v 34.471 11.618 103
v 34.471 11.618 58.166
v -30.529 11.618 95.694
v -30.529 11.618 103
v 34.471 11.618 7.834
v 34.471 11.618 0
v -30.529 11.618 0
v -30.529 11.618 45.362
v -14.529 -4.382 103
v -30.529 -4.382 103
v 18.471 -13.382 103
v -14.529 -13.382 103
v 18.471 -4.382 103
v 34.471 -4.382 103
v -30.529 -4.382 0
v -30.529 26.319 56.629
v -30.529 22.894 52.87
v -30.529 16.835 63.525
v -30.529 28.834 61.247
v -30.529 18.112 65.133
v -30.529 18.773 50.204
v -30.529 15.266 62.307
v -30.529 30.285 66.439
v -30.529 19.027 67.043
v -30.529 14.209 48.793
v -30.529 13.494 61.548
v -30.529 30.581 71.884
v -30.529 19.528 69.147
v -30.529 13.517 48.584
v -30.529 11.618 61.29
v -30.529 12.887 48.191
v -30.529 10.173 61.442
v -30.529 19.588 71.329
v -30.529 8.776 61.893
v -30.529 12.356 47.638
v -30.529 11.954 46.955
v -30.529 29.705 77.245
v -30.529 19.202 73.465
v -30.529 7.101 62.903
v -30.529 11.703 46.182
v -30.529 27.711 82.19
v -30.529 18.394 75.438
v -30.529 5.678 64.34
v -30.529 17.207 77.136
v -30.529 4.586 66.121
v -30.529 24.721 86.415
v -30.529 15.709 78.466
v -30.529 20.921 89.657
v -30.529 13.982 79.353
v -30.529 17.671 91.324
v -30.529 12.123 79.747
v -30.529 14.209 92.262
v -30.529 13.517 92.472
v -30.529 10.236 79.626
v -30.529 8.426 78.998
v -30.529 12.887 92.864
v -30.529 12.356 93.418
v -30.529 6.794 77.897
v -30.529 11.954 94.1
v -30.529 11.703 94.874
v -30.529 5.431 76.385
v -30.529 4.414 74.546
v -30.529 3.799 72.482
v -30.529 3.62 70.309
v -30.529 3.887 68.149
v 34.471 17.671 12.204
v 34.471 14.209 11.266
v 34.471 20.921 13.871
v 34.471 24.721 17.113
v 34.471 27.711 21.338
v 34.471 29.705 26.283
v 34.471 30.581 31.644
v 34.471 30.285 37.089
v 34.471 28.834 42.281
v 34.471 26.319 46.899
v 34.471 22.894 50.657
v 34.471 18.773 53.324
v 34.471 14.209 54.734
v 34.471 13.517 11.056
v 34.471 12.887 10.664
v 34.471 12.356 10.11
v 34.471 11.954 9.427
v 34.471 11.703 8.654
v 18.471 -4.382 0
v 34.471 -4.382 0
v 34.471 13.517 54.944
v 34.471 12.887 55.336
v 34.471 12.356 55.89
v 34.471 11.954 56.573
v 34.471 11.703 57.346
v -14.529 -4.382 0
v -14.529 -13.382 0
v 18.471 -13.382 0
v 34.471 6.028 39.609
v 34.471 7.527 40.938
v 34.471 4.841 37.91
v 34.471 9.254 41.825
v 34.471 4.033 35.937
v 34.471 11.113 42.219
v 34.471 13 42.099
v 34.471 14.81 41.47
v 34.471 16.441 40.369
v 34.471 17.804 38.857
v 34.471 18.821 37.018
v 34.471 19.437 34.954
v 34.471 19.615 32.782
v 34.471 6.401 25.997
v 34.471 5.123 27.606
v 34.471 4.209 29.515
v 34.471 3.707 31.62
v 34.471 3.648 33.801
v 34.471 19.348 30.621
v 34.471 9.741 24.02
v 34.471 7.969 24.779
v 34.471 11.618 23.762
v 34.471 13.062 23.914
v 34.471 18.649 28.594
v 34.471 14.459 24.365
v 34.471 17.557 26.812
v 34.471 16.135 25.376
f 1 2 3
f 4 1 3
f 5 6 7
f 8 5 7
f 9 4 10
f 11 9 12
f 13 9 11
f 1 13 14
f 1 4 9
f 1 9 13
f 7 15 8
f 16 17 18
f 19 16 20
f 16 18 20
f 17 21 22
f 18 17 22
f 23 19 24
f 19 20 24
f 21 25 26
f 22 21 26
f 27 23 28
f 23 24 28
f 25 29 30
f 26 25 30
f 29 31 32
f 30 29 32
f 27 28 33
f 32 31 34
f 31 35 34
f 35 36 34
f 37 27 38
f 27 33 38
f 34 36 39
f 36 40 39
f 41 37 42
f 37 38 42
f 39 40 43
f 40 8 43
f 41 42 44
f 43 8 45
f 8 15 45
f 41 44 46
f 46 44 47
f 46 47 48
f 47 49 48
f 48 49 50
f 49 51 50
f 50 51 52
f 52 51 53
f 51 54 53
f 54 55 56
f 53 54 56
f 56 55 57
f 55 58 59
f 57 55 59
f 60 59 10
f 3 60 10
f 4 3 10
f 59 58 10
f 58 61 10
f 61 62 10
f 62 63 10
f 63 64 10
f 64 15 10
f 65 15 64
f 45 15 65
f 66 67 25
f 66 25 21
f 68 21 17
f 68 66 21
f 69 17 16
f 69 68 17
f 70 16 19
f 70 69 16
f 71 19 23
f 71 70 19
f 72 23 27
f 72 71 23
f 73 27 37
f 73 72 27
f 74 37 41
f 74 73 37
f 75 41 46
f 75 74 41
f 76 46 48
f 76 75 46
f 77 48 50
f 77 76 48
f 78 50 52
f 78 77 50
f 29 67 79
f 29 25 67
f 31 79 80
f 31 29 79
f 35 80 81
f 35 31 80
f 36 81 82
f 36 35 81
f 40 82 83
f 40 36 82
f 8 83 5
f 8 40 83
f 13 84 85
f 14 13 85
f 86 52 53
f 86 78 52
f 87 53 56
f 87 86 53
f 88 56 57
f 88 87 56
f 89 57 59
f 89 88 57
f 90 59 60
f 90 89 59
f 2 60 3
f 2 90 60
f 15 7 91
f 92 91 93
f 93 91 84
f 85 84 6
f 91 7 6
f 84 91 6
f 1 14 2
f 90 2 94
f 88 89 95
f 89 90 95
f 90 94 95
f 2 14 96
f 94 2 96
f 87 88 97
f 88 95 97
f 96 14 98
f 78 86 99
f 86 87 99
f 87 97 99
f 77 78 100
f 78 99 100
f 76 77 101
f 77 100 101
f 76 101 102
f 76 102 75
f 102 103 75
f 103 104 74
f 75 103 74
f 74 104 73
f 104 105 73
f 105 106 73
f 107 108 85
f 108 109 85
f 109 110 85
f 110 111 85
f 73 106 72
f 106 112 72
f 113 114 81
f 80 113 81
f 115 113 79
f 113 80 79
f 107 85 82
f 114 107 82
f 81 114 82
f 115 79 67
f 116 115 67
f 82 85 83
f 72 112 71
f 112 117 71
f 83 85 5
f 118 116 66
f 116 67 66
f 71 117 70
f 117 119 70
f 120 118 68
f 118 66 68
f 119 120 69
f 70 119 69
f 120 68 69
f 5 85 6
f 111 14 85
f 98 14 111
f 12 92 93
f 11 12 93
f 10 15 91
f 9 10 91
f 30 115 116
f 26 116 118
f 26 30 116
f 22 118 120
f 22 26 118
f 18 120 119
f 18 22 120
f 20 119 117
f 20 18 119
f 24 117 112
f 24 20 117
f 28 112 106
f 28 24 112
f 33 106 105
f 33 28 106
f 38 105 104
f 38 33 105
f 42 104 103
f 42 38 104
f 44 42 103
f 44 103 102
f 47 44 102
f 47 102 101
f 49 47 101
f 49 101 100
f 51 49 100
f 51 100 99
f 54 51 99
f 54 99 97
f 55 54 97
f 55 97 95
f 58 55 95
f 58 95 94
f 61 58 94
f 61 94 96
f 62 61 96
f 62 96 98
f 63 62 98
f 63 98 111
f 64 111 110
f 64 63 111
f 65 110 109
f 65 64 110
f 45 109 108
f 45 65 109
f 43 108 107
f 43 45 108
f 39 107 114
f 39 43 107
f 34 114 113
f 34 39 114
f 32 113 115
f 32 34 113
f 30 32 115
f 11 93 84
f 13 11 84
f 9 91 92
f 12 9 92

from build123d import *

# Parameters (mm, degrees)
BOSS_EXTRUDE1_DEPTH             = 103
BOSS_EXTRUDE4_REACH             = 109.274
BOSS_EXTRUDE4_DIRECTION_2_REACH = 109.274
CUT_EXTRUDE1_DEPTH              = 111.752171083
CUT_EXTRUDE1_DEPTH_BACK         = 111.752171083
SKETCH4_R                       = 8
FILLET1_R                       = 3


with BuildPart() as part:
    # Sketch2 → Boss-Extrude1 (new body)
    with BuildSketch(Plane.XY):
        Polygon((-14.529411765, -4.382352941), (-14.529411765, -13.382352941), (18.470588235, -13.382352941), (18.470588235, -4.382352941), (34.470588235, -4.382352941), (34.470588235, 11.617647059), (-30.529411765, 11.617647059), (-30.529411765, -4.382352941), align=None)
    extrude(amount=BOSS_EXTRUDE1_DEPTH)

    # Boss-Extrude4: up to this plane
    boss_extrude4_end = Plane(origin=(34.470588235, 11.617647059, 103), z_dir=(-1, 0, 0))
    # Sketch3 → Boss-Extrude4 (add, up to the surface)
    with BuildSketch(Plane(origin=(-18.747367118, 0, 10.823797452), x_dir=(0, 1, 0), z_dir=(0.866025403784438, 0, -0.500000000000001)), mode=Mode.PRIVATE) as boss_extrude4_sk1:
        with BuildLine():
            Line((11.617647059, 64.814132443), (11.617647059, 26.814132443))
            ThreePointArc((11.617647059, 26.814132443), (30.617647059, 45.814132443), (11.617647059, 64.814132443))
        make_face()
    boss_extrude4_tool1 = split(extrude(boss_extrude4_sk1.sketch, amount=BOSS_EXTRUDE4_REACH, mode=Mode.PRIVATE), bisect_by=boss_extrude4_end, keep=Keep.BOTH, mode=Mode.PRIVATE)
    add(boss_extrude4_tool1.solids().sort_by_distance((4.159699, 19.681498, 50.5))[0])

    # Boss-Extrude4 direction 2: up to this plane
    boss_extrude4_direction_2_end = Plane(origin=(-30.529411765, 11.617647059, 103), z_dir=(1, 0, 0))
    # Sketch3 → Boss-Extrude4 direction 2 (add, up to the surface)
    with BuildSketch(Plane(origin=(-18.747367118, 0, 10.823797452), x_dir=(0, 1, 0), z_dir=(0.866025403784438, 0, -0.500000000000001)), mode=Mode.PRIVATE) as boss_extrude4_direction_2_sk1:
        with BuildLine():
            Line((11.617647059, 64.814132443), (11.617647059, 26.814132443))
            ThreePointArc((11.617647059, 26.814132443), (30.617647059, 45.814132443), (11.617647059, 64.814132443))
        make_face()
    boss_extrude4_direction_2_tool1 = split(extrude(boss_extrude4_direction_2_sk1.sketch, amount=-BOSS_EXTRUDE4_DIRECTION_2_REACH, mode=Mode.PRIVATE), bisect_by=boss_extrude4_direction_2_end, keep=Keep.BOTH, mode=Mode.PRIVATE)
    add(boss_extrude4_direction_2_tool1.solids().sort_by_distance((4.159699, 19.681498, 50.5))[0])

    # Sketch4 → Cut-Extrude1 (cut, two sides: drawn at the far end of the back side and taken through both)
    with BuildSketch(Plane(origin=(-18.747367118, 0, 10.823797452), x_dir=(0, 1, 0), z_dir=(0.866025403784438, 0, -0.500000000000001)).offset(-CUT_EXTRUDE1_DEPTH_BACK)):
        with Locations(Location((11.617647059, 45.814132443, 0), (0, 0, 270))):
            Circle(SKETCH4_R)
    extrude(amount=CUT_EXTRUDE1_DEPTH + CUT_EXTRUDE1_DEPTH_BACK, mode=Mode.SUBTRACT)

    # Fillet1
    fillet1_edges = [part.edges().sort_by_distance(p)[0] for p in [
        (1.970588235, 11.617647059, 73.703193978),
        (1.970588235, 11.617647059, 29.824573519),
    ]]
    fillet(fillet1_edges, radius=FILLET1_R)


solid = part.part
